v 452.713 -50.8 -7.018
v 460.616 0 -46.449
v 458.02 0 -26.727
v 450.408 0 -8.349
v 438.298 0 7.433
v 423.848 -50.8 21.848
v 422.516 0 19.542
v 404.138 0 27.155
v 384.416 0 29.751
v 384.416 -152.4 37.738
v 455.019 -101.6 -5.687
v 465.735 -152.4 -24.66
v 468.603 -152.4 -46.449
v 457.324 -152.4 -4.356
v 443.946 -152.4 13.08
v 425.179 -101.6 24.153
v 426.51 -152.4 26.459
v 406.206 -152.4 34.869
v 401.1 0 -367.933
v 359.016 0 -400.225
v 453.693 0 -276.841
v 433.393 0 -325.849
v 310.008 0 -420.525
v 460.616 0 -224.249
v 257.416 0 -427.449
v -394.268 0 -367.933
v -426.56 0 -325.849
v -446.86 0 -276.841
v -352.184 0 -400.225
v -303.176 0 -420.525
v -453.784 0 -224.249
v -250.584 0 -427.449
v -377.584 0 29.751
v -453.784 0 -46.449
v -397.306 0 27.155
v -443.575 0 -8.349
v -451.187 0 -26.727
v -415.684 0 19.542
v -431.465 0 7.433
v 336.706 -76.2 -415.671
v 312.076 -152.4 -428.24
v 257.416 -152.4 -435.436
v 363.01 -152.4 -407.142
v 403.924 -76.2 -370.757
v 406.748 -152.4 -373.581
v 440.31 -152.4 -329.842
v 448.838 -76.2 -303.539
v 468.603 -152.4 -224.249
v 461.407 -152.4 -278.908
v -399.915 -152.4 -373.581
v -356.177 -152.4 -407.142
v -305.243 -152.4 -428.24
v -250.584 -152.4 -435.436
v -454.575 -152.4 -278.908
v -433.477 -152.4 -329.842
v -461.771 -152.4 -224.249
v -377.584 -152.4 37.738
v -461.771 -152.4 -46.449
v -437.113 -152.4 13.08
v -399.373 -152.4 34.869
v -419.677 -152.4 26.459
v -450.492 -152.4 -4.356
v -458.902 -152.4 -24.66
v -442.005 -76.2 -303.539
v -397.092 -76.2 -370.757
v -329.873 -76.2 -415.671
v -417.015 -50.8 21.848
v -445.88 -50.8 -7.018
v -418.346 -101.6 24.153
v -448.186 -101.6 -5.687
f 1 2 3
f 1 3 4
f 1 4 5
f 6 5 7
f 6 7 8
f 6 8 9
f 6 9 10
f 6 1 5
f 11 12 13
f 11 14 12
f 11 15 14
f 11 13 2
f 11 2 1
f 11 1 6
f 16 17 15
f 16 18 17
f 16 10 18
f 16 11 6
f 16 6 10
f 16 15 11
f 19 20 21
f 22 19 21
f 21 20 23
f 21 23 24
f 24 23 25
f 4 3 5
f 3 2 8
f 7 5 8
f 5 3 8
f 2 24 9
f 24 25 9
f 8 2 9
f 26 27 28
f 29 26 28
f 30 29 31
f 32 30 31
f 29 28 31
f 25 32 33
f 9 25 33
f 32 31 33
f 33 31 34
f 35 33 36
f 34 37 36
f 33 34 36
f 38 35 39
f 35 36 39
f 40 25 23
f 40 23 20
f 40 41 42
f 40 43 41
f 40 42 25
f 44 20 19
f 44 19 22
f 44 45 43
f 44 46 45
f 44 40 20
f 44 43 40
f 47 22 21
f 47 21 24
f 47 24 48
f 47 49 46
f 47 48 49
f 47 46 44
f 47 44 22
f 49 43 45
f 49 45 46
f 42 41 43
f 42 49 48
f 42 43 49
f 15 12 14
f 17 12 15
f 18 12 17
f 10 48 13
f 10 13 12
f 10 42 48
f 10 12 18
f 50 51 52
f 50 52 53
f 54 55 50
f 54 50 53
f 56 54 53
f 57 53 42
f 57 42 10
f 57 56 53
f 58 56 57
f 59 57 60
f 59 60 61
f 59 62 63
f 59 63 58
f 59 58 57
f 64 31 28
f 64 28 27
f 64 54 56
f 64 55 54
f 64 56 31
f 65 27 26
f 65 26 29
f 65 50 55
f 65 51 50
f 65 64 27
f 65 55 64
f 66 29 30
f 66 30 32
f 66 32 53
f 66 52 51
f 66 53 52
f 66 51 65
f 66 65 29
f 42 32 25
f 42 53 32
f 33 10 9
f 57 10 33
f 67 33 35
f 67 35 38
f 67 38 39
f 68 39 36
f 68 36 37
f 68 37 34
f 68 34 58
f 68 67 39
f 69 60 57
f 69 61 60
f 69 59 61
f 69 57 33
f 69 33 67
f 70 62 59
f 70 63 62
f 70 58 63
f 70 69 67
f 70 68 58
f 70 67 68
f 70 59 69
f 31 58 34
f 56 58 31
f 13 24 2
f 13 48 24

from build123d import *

# Parameters (mm, degrees)
F1_DEPTH = 152.4
F1_TAPER = -3


with BuildPart() as f1:
    # F0 (on Front) → F1 (new body)
    with BuildSketch(Plane.XZ):
        with BuildLine():
            Line((384.4163761884, 29.7510090653), (-377.5836238116, 29.7510090653))
            ThreePointArc((-377.5836238116, 29.7510090653), (-431.465160538, 7.4325457917), (-453.7836238116, -46.4489909347))
            Line((-453.7836238116, -46.4489909347), (-453.7836238116, -224.2489909347))
            ThreePointArc((-453.7836238116, -224.2489909347), (-394.2677217487, -367.9330888718), (-250.5836238116, -427.4489909347))
            Line((-250.5836238116, -427.4489909347), (257.4163761884, -427.4489909347))
            ThreePointArc((257.4163761884, -427.4489909347), (401.1004741255, -367.9330888718), (460.6163761884, -224.2489909347))
            Line((460.6163761884, -224.2489909347), (460.6163761884, -46.4489909347))
            ThreePointArc((460.6163761884, -46.4489909347), (438.2979129148, 7.4325457917), (384.4163761884, 29.7510090653))
        make_face()
    extrude(amount=F1_DEPTH, taper=F1_TAPER)


solid = f1.part
